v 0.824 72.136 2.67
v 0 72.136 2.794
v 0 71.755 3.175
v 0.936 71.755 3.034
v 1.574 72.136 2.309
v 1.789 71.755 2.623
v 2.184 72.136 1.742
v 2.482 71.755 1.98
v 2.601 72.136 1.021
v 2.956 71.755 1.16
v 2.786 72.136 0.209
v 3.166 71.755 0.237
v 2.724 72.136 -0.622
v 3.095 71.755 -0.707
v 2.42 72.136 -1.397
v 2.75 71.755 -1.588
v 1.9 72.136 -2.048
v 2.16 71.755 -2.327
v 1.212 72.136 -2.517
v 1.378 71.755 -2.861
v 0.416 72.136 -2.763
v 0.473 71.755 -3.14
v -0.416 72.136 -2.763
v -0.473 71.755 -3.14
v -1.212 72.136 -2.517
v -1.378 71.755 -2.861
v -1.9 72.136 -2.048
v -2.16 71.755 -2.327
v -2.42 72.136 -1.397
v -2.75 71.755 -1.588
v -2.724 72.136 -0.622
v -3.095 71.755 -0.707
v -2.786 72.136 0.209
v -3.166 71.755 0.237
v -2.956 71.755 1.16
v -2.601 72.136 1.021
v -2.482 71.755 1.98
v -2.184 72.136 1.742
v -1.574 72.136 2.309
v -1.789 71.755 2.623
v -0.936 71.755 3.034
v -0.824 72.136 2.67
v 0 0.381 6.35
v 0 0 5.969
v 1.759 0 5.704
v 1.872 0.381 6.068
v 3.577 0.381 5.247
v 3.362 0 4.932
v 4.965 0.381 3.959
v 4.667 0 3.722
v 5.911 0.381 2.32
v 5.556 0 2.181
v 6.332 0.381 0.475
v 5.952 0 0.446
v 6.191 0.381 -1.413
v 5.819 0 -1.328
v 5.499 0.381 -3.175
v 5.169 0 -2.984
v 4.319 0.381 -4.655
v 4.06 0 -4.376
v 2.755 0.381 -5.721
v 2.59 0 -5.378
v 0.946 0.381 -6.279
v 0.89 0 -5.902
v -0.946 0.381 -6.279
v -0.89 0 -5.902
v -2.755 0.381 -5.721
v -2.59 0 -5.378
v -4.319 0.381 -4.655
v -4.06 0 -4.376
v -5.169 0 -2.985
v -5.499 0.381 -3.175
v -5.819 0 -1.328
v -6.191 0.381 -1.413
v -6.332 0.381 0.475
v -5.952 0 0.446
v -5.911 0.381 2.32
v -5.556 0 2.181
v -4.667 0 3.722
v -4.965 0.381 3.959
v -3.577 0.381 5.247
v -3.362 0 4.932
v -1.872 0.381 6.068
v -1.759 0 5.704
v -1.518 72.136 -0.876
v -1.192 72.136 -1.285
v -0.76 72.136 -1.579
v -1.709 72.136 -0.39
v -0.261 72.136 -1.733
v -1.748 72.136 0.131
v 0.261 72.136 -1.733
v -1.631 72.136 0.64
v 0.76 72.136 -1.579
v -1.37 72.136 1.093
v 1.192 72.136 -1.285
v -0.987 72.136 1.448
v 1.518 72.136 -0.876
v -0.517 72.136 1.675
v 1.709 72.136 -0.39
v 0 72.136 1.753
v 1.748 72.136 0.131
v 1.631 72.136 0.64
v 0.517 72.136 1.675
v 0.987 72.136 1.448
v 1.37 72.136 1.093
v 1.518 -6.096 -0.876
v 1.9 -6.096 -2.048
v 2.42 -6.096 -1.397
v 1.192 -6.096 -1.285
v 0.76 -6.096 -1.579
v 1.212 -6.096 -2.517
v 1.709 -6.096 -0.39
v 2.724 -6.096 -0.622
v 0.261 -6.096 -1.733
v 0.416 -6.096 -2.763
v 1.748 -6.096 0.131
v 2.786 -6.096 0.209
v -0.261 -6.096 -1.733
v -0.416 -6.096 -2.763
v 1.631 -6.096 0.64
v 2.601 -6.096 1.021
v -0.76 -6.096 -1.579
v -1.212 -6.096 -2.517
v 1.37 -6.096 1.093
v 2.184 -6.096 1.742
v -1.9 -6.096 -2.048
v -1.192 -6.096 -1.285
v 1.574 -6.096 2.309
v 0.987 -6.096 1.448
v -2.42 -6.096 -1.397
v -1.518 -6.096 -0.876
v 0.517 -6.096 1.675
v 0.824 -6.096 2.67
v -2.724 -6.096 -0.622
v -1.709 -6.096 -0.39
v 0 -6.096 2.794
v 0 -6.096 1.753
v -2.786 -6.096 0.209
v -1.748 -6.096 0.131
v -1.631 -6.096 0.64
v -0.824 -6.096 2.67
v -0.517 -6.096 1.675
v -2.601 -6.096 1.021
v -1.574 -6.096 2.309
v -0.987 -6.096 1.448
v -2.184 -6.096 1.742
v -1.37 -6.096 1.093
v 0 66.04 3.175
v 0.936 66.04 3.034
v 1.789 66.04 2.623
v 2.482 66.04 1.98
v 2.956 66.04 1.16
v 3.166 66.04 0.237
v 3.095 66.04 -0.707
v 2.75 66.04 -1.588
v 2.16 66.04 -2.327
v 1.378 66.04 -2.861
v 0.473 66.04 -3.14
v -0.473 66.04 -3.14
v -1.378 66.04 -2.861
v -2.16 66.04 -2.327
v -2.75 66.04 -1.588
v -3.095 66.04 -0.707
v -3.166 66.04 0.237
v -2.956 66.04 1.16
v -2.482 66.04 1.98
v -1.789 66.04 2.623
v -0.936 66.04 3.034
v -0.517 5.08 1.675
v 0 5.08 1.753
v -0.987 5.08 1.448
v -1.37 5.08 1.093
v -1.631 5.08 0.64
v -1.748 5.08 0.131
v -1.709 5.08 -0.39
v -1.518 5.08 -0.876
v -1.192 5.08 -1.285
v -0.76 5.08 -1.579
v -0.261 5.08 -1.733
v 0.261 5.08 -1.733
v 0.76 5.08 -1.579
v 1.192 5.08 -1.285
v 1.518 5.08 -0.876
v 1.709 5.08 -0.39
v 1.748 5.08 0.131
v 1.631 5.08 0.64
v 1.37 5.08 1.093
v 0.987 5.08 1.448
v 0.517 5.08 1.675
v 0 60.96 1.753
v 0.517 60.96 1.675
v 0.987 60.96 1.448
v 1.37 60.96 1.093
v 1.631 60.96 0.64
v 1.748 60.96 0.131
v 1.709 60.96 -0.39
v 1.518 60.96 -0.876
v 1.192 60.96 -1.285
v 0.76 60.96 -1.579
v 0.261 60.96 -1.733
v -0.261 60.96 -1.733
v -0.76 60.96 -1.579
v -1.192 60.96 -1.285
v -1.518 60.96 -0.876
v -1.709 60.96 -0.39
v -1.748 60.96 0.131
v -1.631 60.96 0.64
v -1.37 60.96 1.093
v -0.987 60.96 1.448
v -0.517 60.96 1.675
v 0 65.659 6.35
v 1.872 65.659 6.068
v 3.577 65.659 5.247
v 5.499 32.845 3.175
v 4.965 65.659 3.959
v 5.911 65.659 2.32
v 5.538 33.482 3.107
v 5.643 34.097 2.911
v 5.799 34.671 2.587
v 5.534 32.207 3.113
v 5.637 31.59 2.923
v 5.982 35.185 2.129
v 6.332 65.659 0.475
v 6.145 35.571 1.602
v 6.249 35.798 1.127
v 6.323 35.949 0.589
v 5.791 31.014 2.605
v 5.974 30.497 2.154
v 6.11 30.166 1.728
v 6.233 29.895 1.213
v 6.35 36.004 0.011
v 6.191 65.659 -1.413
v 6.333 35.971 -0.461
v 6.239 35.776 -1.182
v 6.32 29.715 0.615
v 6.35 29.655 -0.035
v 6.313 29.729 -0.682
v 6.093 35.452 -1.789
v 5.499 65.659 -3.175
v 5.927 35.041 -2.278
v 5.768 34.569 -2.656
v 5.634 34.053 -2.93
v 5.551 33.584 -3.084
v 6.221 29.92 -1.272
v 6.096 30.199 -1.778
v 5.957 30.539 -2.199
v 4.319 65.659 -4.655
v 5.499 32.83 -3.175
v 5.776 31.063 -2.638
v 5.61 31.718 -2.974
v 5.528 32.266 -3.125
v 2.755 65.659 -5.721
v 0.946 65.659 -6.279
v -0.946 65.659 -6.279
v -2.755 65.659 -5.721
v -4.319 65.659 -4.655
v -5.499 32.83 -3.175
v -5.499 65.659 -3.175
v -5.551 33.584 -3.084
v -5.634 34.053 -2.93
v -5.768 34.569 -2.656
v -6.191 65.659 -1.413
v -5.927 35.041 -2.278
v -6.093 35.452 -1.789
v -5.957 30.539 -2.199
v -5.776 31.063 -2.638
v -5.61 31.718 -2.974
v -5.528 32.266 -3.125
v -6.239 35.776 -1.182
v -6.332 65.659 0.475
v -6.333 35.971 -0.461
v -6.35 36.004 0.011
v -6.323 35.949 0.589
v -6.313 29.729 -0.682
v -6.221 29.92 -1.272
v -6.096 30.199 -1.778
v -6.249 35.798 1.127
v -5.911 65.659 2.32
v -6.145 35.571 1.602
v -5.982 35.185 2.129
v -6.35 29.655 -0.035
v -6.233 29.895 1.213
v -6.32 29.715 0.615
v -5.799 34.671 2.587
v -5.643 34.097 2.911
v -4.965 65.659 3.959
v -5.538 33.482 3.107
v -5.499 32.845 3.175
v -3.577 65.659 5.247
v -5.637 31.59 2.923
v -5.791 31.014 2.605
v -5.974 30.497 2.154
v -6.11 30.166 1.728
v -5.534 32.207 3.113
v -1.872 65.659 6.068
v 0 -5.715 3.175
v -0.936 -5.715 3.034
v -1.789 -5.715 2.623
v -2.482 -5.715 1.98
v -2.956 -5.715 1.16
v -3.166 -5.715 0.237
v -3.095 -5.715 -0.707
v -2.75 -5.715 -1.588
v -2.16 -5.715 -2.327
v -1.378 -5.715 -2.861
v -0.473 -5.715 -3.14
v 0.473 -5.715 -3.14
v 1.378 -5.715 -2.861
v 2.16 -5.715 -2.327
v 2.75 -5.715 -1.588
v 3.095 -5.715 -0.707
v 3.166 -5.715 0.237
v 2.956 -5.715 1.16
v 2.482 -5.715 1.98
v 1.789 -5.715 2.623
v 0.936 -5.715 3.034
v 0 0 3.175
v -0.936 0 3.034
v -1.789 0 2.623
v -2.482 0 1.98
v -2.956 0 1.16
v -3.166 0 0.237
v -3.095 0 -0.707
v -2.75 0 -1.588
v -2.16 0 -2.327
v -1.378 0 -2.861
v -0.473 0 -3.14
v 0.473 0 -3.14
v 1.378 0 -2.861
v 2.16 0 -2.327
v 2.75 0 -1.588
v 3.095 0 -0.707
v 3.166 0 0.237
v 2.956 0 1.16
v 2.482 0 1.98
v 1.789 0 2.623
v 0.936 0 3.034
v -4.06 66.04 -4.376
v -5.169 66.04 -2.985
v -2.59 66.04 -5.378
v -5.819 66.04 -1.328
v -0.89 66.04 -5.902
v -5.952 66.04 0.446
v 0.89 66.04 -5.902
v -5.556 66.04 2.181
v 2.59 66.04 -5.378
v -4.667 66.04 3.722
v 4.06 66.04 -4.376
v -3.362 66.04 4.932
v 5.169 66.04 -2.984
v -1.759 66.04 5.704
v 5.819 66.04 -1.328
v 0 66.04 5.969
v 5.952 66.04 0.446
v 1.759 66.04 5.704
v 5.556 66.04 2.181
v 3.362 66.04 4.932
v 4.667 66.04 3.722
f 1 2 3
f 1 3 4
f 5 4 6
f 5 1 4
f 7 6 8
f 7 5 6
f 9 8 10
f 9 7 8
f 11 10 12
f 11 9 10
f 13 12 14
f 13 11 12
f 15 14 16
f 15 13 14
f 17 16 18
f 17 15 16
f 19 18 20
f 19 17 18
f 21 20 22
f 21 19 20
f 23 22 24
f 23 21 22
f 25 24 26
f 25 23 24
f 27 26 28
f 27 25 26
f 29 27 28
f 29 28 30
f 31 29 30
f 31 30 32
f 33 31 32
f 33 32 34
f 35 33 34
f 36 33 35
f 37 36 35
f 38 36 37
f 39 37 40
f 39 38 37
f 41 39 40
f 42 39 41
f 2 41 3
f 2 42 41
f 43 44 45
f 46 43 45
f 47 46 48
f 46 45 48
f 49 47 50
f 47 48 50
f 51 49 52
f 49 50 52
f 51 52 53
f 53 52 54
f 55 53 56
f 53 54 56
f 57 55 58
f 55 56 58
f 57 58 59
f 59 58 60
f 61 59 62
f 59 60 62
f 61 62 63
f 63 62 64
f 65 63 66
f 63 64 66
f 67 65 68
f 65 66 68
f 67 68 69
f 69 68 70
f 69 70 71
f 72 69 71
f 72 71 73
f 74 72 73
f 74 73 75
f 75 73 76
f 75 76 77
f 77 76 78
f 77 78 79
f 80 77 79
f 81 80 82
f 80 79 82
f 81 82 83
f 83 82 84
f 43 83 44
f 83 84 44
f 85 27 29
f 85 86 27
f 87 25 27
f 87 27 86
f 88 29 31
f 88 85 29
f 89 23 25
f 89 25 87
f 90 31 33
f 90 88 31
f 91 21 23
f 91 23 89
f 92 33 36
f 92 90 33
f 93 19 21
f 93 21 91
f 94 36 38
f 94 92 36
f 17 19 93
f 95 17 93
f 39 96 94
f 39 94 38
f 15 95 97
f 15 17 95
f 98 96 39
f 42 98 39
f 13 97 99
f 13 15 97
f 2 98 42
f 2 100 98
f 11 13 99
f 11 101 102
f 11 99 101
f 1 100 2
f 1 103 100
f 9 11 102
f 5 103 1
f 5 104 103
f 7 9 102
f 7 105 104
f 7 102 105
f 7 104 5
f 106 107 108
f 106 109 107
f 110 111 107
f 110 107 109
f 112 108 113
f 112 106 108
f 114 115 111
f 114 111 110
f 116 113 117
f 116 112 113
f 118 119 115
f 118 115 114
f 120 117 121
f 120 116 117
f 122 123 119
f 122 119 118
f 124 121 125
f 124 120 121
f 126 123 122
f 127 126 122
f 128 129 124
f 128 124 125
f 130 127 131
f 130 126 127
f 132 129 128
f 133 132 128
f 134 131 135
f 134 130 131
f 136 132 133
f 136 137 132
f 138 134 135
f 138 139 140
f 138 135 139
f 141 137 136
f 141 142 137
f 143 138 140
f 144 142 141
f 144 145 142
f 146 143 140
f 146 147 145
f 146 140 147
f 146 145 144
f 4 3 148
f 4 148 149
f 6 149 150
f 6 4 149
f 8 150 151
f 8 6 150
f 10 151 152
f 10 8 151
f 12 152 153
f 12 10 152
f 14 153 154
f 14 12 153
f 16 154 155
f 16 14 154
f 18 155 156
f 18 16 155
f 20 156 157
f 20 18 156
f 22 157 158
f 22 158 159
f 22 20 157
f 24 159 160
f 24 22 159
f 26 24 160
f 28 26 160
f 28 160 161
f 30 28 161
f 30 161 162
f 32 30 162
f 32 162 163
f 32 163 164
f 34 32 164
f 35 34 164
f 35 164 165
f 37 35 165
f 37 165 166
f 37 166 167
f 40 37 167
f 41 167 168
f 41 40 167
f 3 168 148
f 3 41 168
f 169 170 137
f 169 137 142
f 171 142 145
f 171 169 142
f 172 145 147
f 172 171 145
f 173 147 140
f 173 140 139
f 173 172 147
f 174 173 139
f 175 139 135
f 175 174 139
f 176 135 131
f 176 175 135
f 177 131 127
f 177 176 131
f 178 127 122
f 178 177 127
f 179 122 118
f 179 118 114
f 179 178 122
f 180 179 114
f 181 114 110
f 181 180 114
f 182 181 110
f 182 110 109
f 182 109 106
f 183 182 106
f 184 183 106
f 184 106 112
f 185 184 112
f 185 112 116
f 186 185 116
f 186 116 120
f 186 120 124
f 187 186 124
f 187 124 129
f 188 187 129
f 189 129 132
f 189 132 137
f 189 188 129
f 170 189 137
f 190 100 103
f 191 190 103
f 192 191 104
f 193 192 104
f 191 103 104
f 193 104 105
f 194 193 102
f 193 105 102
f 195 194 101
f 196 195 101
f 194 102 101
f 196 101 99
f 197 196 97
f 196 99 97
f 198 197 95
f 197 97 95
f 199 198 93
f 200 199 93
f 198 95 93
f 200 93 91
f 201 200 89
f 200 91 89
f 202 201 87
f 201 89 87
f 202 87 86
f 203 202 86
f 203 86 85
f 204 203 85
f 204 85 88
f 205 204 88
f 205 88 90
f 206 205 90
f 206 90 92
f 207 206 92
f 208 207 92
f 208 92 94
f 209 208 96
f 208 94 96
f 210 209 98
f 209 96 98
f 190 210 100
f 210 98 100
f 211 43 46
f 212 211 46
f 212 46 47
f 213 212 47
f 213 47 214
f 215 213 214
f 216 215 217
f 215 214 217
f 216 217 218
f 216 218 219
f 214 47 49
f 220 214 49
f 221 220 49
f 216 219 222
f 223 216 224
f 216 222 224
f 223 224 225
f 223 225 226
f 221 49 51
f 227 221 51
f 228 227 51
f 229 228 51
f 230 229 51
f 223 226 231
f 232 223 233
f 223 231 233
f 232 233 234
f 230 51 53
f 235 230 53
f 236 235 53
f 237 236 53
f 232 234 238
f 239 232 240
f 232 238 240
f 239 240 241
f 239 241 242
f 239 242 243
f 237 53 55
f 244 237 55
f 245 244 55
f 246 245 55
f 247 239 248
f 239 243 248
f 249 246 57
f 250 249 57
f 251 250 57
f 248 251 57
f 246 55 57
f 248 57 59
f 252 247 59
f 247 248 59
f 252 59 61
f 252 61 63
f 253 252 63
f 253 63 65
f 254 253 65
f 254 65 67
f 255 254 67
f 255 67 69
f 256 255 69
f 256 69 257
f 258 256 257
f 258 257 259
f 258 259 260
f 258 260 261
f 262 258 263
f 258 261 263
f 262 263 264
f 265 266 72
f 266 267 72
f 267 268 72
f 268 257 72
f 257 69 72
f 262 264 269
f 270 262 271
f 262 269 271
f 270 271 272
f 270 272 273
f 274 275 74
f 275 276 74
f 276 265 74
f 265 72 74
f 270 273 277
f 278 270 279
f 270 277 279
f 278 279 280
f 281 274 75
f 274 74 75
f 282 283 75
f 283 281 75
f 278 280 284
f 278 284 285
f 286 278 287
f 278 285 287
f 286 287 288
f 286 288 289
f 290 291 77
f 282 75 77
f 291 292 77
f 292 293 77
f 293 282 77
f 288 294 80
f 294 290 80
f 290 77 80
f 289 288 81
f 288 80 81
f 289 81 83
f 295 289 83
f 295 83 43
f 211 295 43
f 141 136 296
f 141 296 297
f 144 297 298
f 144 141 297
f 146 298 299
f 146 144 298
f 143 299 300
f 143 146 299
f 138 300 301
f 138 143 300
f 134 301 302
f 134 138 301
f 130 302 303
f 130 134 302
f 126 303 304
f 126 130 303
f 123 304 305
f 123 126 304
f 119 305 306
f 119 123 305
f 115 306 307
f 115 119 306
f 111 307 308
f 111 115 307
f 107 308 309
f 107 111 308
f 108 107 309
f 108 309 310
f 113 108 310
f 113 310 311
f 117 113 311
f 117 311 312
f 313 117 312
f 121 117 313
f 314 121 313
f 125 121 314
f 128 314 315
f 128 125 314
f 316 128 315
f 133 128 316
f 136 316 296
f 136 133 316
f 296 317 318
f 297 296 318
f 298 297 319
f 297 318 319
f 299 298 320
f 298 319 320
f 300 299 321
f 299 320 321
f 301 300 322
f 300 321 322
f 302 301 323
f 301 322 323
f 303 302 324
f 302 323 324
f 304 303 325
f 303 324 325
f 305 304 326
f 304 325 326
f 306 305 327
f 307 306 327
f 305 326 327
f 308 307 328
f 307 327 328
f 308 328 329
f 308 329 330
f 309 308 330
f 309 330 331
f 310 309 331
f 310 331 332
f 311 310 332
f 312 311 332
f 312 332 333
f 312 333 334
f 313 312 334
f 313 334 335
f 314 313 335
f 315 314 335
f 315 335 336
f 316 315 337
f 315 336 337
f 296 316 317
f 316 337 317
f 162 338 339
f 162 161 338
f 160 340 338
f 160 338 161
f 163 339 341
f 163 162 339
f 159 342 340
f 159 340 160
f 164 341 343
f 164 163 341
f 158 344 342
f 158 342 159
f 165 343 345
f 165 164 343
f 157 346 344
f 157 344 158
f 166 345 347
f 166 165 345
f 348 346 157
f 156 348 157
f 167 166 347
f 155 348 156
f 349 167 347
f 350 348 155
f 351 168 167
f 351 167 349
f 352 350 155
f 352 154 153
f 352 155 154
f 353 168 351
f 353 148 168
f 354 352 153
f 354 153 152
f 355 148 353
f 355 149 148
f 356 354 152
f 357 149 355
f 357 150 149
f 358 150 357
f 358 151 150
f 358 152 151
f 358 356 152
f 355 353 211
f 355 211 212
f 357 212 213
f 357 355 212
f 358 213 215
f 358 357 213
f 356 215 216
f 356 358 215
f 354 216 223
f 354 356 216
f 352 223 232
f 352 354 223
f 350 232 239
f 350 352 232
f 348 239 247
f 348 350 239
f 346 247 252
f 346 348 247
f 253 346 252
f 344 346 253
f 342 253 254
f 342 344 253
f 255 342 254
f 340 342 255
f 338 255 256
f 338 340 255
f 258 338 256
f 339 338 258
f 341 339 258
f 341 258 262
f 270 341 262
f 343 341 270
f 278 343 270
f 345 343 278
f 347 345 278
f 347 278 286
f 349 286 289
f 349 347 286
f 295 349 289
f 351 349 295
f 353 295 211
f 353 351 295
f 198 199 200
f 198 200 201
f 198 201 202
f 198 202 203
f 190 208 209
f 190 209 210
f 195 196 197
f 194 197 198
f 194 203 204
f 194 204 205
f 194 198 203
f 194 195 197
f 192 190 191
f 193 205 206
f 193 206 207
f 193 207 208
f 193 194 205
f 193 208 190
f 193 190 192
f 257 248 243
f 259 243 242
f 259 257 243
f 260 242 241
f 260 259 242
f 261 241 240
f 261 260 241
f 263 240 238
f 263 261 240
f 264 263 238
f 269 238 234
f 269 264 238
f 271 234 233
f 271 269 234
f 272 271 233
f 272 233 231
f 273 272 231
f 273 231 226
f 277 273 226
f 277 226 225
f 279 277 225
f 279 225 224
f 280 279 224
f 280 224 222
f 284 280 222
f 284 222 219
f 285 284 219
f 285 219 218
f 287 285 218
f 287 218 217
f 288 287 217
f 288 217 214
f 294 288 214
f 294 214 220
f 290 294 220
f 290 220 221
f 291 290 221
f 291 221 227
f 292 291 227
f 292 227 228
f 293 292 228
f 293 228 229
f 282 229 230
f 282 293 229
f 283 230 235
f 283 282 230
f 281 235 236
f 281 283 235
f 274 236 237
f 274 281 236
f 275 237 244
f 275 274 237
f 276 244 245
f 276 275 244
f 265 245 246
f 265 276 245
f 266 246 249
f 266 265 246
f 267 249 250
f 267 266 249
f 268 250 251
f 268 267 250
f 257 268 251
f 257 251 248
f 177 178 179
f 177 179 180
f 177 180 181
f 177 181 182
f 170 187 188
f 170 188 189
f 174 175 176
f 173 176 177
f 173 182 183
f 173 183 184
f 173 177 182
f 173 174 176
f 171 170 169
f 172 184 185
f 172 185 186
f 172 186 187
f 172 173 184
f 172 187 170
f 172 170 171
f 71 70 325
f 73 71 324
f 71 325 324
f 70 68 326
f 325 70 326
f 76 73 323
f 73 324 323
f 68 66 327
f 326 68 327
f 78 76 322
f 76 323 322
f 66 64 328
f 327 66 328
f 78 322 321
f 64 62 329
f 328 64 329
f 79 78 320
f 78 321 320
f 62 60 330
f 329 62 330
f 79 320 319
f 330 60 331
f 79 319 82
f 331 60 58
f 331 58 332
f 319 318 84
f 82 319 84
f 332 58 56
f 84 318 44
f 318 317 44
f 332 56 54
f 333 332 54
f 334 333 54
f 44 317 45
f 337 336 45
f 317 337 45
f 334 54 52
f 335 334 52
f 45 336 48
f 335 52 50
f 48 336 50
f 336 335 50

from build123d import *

# Parameters (mm, degrees)
SKETCH1_R                     = 6.35
MAIN_BODY_BOSS_EXTRUDE1_DEPTH = 66.04
SKETCH2_R                     = 3.175
TENDON_1_BOSS_EXTRUDE2_DEPTH  = 6.096
TENDON_START                  = 6.096
SKETCH3_R                     = 3.175
TENDON_2_BOSS_EXTRUDE3_DEPTH  = 6.096
SKETCH4_R                     = 1.7526
F_10_32_CUT_EXTRUDE1_DEPTH    = 11.176
F_10_32_START                 = -11.176
SKETCH5_R                     = 1.7526
F_10_32_CUT_EXTRUDE2_DEPTH    = 11.176
CHAMFER1_SIZE                 = 0.381
CUT_EXTRUDE3_DEPTH            = 73.692829743
CUT_EXTRUDE3_DEPTH_BACK       = 73.692829743
SKETCH6_R                     = 3.175


with BuildPart() as part:
    # Sketch1 → Main Body Boss-Extrude1 (new body)
    with BuildSketch(Plane(origin=(0, 0, 0), x_dir=(1, 0, 0), z_dir=(0, 1, 0))):
        with Locations(Location((0, 0, 0), (0, 0, 270))):
            Circle(SKETCH1_R)
    extrude(amount=MAIN_BODY_BOSS_EXTRUDE1_DEPTH)

    # Sketch2 → Tendon 1 Boss-Extrude2 (add)
    with BuildSketch(Plane.XZ):
        with Locations(Location((0, 0, 0), (0, 0, 90))):
            Circle(SKETCH2_R)
    extrude(amount=TENDON_1_BOSS_EXTRUDE2_DEPTH)

    # Sketch3 → Tendon 2 Boss-Extrude3 (add)
    with BuildSketch(Plane(origin=(0, 66.04, 0), x_dir=(1, 0, 0), z_dir=(0, 1, 0)).offset(TENDON_START)):
        with Locations(Location((0, 0, 0), (0, 0, 270))):
            Circle(SKETCH3_R)
    extrude(amount=-TENDON_2_BOSS_EXTRUDE3_DEPTH)

    # Sketch4 → 10_32 Cut-Extrude1 (cut)
    with BuildSketch(Plane(origin=(0, 72.136, 0), x_dir=(1, 0, 0), z_dir=(0, 1, 0))):
        with Locations(Location((0, 0, 0), (0, 0, 270))):
            Circle(SKETCH4_R)
    extrude(amount=-F_10_32_CUT_EXTRUDE1_DEPTH, mode=Mode.SUBTRACT)

    # Sketch5 → 10_32 Cut-Extrude2 (cut)
    with BuildSketch(Plane.XZ.offset(6.096).offset(F_10_32_START)):
        with Locations(Location((0, 0, 0), (0, 0, 90))):
            Circle(SKETCH5_R)
    extrude(amount=F_10_32_CUT_EXTRUDE2_DEPTH, mode=Mode.SUBTRACT)

    # Chamfer1
    chamfer1_edges = [part.edges().sort_by_distance(p)[0] for p in [
        (0, 72.136, -3.175),
        (0, 0, -6.35),
        (0, 66.04, -6.35),
        (0, -6.096, -3.175),
    ]]
    chamfer(chamfer1_edges, length=CHAMFER1_SIZE)

    # Sketch6 → Cut-Extrude3 (cut, two sides: drawn at the far end of the back side and taken through both)
    with BuildSketch(Plane(origin=(0, 0, 0), x_dir=(0, 0, -1), z_dir=(1, 0, 0)).offset(-CUT_EXTRUDE3_DEPTH_BACK)):
        with Locations((0, 32.8295)):
            Circle(SKETCH6_R)
    extrude(amount=CUT_EXTRUDE3_DEPTH + CUT_EXTRUDE3_DEPTH_BACK, mode=Mode.SUBTRACT)


solid = part.part
